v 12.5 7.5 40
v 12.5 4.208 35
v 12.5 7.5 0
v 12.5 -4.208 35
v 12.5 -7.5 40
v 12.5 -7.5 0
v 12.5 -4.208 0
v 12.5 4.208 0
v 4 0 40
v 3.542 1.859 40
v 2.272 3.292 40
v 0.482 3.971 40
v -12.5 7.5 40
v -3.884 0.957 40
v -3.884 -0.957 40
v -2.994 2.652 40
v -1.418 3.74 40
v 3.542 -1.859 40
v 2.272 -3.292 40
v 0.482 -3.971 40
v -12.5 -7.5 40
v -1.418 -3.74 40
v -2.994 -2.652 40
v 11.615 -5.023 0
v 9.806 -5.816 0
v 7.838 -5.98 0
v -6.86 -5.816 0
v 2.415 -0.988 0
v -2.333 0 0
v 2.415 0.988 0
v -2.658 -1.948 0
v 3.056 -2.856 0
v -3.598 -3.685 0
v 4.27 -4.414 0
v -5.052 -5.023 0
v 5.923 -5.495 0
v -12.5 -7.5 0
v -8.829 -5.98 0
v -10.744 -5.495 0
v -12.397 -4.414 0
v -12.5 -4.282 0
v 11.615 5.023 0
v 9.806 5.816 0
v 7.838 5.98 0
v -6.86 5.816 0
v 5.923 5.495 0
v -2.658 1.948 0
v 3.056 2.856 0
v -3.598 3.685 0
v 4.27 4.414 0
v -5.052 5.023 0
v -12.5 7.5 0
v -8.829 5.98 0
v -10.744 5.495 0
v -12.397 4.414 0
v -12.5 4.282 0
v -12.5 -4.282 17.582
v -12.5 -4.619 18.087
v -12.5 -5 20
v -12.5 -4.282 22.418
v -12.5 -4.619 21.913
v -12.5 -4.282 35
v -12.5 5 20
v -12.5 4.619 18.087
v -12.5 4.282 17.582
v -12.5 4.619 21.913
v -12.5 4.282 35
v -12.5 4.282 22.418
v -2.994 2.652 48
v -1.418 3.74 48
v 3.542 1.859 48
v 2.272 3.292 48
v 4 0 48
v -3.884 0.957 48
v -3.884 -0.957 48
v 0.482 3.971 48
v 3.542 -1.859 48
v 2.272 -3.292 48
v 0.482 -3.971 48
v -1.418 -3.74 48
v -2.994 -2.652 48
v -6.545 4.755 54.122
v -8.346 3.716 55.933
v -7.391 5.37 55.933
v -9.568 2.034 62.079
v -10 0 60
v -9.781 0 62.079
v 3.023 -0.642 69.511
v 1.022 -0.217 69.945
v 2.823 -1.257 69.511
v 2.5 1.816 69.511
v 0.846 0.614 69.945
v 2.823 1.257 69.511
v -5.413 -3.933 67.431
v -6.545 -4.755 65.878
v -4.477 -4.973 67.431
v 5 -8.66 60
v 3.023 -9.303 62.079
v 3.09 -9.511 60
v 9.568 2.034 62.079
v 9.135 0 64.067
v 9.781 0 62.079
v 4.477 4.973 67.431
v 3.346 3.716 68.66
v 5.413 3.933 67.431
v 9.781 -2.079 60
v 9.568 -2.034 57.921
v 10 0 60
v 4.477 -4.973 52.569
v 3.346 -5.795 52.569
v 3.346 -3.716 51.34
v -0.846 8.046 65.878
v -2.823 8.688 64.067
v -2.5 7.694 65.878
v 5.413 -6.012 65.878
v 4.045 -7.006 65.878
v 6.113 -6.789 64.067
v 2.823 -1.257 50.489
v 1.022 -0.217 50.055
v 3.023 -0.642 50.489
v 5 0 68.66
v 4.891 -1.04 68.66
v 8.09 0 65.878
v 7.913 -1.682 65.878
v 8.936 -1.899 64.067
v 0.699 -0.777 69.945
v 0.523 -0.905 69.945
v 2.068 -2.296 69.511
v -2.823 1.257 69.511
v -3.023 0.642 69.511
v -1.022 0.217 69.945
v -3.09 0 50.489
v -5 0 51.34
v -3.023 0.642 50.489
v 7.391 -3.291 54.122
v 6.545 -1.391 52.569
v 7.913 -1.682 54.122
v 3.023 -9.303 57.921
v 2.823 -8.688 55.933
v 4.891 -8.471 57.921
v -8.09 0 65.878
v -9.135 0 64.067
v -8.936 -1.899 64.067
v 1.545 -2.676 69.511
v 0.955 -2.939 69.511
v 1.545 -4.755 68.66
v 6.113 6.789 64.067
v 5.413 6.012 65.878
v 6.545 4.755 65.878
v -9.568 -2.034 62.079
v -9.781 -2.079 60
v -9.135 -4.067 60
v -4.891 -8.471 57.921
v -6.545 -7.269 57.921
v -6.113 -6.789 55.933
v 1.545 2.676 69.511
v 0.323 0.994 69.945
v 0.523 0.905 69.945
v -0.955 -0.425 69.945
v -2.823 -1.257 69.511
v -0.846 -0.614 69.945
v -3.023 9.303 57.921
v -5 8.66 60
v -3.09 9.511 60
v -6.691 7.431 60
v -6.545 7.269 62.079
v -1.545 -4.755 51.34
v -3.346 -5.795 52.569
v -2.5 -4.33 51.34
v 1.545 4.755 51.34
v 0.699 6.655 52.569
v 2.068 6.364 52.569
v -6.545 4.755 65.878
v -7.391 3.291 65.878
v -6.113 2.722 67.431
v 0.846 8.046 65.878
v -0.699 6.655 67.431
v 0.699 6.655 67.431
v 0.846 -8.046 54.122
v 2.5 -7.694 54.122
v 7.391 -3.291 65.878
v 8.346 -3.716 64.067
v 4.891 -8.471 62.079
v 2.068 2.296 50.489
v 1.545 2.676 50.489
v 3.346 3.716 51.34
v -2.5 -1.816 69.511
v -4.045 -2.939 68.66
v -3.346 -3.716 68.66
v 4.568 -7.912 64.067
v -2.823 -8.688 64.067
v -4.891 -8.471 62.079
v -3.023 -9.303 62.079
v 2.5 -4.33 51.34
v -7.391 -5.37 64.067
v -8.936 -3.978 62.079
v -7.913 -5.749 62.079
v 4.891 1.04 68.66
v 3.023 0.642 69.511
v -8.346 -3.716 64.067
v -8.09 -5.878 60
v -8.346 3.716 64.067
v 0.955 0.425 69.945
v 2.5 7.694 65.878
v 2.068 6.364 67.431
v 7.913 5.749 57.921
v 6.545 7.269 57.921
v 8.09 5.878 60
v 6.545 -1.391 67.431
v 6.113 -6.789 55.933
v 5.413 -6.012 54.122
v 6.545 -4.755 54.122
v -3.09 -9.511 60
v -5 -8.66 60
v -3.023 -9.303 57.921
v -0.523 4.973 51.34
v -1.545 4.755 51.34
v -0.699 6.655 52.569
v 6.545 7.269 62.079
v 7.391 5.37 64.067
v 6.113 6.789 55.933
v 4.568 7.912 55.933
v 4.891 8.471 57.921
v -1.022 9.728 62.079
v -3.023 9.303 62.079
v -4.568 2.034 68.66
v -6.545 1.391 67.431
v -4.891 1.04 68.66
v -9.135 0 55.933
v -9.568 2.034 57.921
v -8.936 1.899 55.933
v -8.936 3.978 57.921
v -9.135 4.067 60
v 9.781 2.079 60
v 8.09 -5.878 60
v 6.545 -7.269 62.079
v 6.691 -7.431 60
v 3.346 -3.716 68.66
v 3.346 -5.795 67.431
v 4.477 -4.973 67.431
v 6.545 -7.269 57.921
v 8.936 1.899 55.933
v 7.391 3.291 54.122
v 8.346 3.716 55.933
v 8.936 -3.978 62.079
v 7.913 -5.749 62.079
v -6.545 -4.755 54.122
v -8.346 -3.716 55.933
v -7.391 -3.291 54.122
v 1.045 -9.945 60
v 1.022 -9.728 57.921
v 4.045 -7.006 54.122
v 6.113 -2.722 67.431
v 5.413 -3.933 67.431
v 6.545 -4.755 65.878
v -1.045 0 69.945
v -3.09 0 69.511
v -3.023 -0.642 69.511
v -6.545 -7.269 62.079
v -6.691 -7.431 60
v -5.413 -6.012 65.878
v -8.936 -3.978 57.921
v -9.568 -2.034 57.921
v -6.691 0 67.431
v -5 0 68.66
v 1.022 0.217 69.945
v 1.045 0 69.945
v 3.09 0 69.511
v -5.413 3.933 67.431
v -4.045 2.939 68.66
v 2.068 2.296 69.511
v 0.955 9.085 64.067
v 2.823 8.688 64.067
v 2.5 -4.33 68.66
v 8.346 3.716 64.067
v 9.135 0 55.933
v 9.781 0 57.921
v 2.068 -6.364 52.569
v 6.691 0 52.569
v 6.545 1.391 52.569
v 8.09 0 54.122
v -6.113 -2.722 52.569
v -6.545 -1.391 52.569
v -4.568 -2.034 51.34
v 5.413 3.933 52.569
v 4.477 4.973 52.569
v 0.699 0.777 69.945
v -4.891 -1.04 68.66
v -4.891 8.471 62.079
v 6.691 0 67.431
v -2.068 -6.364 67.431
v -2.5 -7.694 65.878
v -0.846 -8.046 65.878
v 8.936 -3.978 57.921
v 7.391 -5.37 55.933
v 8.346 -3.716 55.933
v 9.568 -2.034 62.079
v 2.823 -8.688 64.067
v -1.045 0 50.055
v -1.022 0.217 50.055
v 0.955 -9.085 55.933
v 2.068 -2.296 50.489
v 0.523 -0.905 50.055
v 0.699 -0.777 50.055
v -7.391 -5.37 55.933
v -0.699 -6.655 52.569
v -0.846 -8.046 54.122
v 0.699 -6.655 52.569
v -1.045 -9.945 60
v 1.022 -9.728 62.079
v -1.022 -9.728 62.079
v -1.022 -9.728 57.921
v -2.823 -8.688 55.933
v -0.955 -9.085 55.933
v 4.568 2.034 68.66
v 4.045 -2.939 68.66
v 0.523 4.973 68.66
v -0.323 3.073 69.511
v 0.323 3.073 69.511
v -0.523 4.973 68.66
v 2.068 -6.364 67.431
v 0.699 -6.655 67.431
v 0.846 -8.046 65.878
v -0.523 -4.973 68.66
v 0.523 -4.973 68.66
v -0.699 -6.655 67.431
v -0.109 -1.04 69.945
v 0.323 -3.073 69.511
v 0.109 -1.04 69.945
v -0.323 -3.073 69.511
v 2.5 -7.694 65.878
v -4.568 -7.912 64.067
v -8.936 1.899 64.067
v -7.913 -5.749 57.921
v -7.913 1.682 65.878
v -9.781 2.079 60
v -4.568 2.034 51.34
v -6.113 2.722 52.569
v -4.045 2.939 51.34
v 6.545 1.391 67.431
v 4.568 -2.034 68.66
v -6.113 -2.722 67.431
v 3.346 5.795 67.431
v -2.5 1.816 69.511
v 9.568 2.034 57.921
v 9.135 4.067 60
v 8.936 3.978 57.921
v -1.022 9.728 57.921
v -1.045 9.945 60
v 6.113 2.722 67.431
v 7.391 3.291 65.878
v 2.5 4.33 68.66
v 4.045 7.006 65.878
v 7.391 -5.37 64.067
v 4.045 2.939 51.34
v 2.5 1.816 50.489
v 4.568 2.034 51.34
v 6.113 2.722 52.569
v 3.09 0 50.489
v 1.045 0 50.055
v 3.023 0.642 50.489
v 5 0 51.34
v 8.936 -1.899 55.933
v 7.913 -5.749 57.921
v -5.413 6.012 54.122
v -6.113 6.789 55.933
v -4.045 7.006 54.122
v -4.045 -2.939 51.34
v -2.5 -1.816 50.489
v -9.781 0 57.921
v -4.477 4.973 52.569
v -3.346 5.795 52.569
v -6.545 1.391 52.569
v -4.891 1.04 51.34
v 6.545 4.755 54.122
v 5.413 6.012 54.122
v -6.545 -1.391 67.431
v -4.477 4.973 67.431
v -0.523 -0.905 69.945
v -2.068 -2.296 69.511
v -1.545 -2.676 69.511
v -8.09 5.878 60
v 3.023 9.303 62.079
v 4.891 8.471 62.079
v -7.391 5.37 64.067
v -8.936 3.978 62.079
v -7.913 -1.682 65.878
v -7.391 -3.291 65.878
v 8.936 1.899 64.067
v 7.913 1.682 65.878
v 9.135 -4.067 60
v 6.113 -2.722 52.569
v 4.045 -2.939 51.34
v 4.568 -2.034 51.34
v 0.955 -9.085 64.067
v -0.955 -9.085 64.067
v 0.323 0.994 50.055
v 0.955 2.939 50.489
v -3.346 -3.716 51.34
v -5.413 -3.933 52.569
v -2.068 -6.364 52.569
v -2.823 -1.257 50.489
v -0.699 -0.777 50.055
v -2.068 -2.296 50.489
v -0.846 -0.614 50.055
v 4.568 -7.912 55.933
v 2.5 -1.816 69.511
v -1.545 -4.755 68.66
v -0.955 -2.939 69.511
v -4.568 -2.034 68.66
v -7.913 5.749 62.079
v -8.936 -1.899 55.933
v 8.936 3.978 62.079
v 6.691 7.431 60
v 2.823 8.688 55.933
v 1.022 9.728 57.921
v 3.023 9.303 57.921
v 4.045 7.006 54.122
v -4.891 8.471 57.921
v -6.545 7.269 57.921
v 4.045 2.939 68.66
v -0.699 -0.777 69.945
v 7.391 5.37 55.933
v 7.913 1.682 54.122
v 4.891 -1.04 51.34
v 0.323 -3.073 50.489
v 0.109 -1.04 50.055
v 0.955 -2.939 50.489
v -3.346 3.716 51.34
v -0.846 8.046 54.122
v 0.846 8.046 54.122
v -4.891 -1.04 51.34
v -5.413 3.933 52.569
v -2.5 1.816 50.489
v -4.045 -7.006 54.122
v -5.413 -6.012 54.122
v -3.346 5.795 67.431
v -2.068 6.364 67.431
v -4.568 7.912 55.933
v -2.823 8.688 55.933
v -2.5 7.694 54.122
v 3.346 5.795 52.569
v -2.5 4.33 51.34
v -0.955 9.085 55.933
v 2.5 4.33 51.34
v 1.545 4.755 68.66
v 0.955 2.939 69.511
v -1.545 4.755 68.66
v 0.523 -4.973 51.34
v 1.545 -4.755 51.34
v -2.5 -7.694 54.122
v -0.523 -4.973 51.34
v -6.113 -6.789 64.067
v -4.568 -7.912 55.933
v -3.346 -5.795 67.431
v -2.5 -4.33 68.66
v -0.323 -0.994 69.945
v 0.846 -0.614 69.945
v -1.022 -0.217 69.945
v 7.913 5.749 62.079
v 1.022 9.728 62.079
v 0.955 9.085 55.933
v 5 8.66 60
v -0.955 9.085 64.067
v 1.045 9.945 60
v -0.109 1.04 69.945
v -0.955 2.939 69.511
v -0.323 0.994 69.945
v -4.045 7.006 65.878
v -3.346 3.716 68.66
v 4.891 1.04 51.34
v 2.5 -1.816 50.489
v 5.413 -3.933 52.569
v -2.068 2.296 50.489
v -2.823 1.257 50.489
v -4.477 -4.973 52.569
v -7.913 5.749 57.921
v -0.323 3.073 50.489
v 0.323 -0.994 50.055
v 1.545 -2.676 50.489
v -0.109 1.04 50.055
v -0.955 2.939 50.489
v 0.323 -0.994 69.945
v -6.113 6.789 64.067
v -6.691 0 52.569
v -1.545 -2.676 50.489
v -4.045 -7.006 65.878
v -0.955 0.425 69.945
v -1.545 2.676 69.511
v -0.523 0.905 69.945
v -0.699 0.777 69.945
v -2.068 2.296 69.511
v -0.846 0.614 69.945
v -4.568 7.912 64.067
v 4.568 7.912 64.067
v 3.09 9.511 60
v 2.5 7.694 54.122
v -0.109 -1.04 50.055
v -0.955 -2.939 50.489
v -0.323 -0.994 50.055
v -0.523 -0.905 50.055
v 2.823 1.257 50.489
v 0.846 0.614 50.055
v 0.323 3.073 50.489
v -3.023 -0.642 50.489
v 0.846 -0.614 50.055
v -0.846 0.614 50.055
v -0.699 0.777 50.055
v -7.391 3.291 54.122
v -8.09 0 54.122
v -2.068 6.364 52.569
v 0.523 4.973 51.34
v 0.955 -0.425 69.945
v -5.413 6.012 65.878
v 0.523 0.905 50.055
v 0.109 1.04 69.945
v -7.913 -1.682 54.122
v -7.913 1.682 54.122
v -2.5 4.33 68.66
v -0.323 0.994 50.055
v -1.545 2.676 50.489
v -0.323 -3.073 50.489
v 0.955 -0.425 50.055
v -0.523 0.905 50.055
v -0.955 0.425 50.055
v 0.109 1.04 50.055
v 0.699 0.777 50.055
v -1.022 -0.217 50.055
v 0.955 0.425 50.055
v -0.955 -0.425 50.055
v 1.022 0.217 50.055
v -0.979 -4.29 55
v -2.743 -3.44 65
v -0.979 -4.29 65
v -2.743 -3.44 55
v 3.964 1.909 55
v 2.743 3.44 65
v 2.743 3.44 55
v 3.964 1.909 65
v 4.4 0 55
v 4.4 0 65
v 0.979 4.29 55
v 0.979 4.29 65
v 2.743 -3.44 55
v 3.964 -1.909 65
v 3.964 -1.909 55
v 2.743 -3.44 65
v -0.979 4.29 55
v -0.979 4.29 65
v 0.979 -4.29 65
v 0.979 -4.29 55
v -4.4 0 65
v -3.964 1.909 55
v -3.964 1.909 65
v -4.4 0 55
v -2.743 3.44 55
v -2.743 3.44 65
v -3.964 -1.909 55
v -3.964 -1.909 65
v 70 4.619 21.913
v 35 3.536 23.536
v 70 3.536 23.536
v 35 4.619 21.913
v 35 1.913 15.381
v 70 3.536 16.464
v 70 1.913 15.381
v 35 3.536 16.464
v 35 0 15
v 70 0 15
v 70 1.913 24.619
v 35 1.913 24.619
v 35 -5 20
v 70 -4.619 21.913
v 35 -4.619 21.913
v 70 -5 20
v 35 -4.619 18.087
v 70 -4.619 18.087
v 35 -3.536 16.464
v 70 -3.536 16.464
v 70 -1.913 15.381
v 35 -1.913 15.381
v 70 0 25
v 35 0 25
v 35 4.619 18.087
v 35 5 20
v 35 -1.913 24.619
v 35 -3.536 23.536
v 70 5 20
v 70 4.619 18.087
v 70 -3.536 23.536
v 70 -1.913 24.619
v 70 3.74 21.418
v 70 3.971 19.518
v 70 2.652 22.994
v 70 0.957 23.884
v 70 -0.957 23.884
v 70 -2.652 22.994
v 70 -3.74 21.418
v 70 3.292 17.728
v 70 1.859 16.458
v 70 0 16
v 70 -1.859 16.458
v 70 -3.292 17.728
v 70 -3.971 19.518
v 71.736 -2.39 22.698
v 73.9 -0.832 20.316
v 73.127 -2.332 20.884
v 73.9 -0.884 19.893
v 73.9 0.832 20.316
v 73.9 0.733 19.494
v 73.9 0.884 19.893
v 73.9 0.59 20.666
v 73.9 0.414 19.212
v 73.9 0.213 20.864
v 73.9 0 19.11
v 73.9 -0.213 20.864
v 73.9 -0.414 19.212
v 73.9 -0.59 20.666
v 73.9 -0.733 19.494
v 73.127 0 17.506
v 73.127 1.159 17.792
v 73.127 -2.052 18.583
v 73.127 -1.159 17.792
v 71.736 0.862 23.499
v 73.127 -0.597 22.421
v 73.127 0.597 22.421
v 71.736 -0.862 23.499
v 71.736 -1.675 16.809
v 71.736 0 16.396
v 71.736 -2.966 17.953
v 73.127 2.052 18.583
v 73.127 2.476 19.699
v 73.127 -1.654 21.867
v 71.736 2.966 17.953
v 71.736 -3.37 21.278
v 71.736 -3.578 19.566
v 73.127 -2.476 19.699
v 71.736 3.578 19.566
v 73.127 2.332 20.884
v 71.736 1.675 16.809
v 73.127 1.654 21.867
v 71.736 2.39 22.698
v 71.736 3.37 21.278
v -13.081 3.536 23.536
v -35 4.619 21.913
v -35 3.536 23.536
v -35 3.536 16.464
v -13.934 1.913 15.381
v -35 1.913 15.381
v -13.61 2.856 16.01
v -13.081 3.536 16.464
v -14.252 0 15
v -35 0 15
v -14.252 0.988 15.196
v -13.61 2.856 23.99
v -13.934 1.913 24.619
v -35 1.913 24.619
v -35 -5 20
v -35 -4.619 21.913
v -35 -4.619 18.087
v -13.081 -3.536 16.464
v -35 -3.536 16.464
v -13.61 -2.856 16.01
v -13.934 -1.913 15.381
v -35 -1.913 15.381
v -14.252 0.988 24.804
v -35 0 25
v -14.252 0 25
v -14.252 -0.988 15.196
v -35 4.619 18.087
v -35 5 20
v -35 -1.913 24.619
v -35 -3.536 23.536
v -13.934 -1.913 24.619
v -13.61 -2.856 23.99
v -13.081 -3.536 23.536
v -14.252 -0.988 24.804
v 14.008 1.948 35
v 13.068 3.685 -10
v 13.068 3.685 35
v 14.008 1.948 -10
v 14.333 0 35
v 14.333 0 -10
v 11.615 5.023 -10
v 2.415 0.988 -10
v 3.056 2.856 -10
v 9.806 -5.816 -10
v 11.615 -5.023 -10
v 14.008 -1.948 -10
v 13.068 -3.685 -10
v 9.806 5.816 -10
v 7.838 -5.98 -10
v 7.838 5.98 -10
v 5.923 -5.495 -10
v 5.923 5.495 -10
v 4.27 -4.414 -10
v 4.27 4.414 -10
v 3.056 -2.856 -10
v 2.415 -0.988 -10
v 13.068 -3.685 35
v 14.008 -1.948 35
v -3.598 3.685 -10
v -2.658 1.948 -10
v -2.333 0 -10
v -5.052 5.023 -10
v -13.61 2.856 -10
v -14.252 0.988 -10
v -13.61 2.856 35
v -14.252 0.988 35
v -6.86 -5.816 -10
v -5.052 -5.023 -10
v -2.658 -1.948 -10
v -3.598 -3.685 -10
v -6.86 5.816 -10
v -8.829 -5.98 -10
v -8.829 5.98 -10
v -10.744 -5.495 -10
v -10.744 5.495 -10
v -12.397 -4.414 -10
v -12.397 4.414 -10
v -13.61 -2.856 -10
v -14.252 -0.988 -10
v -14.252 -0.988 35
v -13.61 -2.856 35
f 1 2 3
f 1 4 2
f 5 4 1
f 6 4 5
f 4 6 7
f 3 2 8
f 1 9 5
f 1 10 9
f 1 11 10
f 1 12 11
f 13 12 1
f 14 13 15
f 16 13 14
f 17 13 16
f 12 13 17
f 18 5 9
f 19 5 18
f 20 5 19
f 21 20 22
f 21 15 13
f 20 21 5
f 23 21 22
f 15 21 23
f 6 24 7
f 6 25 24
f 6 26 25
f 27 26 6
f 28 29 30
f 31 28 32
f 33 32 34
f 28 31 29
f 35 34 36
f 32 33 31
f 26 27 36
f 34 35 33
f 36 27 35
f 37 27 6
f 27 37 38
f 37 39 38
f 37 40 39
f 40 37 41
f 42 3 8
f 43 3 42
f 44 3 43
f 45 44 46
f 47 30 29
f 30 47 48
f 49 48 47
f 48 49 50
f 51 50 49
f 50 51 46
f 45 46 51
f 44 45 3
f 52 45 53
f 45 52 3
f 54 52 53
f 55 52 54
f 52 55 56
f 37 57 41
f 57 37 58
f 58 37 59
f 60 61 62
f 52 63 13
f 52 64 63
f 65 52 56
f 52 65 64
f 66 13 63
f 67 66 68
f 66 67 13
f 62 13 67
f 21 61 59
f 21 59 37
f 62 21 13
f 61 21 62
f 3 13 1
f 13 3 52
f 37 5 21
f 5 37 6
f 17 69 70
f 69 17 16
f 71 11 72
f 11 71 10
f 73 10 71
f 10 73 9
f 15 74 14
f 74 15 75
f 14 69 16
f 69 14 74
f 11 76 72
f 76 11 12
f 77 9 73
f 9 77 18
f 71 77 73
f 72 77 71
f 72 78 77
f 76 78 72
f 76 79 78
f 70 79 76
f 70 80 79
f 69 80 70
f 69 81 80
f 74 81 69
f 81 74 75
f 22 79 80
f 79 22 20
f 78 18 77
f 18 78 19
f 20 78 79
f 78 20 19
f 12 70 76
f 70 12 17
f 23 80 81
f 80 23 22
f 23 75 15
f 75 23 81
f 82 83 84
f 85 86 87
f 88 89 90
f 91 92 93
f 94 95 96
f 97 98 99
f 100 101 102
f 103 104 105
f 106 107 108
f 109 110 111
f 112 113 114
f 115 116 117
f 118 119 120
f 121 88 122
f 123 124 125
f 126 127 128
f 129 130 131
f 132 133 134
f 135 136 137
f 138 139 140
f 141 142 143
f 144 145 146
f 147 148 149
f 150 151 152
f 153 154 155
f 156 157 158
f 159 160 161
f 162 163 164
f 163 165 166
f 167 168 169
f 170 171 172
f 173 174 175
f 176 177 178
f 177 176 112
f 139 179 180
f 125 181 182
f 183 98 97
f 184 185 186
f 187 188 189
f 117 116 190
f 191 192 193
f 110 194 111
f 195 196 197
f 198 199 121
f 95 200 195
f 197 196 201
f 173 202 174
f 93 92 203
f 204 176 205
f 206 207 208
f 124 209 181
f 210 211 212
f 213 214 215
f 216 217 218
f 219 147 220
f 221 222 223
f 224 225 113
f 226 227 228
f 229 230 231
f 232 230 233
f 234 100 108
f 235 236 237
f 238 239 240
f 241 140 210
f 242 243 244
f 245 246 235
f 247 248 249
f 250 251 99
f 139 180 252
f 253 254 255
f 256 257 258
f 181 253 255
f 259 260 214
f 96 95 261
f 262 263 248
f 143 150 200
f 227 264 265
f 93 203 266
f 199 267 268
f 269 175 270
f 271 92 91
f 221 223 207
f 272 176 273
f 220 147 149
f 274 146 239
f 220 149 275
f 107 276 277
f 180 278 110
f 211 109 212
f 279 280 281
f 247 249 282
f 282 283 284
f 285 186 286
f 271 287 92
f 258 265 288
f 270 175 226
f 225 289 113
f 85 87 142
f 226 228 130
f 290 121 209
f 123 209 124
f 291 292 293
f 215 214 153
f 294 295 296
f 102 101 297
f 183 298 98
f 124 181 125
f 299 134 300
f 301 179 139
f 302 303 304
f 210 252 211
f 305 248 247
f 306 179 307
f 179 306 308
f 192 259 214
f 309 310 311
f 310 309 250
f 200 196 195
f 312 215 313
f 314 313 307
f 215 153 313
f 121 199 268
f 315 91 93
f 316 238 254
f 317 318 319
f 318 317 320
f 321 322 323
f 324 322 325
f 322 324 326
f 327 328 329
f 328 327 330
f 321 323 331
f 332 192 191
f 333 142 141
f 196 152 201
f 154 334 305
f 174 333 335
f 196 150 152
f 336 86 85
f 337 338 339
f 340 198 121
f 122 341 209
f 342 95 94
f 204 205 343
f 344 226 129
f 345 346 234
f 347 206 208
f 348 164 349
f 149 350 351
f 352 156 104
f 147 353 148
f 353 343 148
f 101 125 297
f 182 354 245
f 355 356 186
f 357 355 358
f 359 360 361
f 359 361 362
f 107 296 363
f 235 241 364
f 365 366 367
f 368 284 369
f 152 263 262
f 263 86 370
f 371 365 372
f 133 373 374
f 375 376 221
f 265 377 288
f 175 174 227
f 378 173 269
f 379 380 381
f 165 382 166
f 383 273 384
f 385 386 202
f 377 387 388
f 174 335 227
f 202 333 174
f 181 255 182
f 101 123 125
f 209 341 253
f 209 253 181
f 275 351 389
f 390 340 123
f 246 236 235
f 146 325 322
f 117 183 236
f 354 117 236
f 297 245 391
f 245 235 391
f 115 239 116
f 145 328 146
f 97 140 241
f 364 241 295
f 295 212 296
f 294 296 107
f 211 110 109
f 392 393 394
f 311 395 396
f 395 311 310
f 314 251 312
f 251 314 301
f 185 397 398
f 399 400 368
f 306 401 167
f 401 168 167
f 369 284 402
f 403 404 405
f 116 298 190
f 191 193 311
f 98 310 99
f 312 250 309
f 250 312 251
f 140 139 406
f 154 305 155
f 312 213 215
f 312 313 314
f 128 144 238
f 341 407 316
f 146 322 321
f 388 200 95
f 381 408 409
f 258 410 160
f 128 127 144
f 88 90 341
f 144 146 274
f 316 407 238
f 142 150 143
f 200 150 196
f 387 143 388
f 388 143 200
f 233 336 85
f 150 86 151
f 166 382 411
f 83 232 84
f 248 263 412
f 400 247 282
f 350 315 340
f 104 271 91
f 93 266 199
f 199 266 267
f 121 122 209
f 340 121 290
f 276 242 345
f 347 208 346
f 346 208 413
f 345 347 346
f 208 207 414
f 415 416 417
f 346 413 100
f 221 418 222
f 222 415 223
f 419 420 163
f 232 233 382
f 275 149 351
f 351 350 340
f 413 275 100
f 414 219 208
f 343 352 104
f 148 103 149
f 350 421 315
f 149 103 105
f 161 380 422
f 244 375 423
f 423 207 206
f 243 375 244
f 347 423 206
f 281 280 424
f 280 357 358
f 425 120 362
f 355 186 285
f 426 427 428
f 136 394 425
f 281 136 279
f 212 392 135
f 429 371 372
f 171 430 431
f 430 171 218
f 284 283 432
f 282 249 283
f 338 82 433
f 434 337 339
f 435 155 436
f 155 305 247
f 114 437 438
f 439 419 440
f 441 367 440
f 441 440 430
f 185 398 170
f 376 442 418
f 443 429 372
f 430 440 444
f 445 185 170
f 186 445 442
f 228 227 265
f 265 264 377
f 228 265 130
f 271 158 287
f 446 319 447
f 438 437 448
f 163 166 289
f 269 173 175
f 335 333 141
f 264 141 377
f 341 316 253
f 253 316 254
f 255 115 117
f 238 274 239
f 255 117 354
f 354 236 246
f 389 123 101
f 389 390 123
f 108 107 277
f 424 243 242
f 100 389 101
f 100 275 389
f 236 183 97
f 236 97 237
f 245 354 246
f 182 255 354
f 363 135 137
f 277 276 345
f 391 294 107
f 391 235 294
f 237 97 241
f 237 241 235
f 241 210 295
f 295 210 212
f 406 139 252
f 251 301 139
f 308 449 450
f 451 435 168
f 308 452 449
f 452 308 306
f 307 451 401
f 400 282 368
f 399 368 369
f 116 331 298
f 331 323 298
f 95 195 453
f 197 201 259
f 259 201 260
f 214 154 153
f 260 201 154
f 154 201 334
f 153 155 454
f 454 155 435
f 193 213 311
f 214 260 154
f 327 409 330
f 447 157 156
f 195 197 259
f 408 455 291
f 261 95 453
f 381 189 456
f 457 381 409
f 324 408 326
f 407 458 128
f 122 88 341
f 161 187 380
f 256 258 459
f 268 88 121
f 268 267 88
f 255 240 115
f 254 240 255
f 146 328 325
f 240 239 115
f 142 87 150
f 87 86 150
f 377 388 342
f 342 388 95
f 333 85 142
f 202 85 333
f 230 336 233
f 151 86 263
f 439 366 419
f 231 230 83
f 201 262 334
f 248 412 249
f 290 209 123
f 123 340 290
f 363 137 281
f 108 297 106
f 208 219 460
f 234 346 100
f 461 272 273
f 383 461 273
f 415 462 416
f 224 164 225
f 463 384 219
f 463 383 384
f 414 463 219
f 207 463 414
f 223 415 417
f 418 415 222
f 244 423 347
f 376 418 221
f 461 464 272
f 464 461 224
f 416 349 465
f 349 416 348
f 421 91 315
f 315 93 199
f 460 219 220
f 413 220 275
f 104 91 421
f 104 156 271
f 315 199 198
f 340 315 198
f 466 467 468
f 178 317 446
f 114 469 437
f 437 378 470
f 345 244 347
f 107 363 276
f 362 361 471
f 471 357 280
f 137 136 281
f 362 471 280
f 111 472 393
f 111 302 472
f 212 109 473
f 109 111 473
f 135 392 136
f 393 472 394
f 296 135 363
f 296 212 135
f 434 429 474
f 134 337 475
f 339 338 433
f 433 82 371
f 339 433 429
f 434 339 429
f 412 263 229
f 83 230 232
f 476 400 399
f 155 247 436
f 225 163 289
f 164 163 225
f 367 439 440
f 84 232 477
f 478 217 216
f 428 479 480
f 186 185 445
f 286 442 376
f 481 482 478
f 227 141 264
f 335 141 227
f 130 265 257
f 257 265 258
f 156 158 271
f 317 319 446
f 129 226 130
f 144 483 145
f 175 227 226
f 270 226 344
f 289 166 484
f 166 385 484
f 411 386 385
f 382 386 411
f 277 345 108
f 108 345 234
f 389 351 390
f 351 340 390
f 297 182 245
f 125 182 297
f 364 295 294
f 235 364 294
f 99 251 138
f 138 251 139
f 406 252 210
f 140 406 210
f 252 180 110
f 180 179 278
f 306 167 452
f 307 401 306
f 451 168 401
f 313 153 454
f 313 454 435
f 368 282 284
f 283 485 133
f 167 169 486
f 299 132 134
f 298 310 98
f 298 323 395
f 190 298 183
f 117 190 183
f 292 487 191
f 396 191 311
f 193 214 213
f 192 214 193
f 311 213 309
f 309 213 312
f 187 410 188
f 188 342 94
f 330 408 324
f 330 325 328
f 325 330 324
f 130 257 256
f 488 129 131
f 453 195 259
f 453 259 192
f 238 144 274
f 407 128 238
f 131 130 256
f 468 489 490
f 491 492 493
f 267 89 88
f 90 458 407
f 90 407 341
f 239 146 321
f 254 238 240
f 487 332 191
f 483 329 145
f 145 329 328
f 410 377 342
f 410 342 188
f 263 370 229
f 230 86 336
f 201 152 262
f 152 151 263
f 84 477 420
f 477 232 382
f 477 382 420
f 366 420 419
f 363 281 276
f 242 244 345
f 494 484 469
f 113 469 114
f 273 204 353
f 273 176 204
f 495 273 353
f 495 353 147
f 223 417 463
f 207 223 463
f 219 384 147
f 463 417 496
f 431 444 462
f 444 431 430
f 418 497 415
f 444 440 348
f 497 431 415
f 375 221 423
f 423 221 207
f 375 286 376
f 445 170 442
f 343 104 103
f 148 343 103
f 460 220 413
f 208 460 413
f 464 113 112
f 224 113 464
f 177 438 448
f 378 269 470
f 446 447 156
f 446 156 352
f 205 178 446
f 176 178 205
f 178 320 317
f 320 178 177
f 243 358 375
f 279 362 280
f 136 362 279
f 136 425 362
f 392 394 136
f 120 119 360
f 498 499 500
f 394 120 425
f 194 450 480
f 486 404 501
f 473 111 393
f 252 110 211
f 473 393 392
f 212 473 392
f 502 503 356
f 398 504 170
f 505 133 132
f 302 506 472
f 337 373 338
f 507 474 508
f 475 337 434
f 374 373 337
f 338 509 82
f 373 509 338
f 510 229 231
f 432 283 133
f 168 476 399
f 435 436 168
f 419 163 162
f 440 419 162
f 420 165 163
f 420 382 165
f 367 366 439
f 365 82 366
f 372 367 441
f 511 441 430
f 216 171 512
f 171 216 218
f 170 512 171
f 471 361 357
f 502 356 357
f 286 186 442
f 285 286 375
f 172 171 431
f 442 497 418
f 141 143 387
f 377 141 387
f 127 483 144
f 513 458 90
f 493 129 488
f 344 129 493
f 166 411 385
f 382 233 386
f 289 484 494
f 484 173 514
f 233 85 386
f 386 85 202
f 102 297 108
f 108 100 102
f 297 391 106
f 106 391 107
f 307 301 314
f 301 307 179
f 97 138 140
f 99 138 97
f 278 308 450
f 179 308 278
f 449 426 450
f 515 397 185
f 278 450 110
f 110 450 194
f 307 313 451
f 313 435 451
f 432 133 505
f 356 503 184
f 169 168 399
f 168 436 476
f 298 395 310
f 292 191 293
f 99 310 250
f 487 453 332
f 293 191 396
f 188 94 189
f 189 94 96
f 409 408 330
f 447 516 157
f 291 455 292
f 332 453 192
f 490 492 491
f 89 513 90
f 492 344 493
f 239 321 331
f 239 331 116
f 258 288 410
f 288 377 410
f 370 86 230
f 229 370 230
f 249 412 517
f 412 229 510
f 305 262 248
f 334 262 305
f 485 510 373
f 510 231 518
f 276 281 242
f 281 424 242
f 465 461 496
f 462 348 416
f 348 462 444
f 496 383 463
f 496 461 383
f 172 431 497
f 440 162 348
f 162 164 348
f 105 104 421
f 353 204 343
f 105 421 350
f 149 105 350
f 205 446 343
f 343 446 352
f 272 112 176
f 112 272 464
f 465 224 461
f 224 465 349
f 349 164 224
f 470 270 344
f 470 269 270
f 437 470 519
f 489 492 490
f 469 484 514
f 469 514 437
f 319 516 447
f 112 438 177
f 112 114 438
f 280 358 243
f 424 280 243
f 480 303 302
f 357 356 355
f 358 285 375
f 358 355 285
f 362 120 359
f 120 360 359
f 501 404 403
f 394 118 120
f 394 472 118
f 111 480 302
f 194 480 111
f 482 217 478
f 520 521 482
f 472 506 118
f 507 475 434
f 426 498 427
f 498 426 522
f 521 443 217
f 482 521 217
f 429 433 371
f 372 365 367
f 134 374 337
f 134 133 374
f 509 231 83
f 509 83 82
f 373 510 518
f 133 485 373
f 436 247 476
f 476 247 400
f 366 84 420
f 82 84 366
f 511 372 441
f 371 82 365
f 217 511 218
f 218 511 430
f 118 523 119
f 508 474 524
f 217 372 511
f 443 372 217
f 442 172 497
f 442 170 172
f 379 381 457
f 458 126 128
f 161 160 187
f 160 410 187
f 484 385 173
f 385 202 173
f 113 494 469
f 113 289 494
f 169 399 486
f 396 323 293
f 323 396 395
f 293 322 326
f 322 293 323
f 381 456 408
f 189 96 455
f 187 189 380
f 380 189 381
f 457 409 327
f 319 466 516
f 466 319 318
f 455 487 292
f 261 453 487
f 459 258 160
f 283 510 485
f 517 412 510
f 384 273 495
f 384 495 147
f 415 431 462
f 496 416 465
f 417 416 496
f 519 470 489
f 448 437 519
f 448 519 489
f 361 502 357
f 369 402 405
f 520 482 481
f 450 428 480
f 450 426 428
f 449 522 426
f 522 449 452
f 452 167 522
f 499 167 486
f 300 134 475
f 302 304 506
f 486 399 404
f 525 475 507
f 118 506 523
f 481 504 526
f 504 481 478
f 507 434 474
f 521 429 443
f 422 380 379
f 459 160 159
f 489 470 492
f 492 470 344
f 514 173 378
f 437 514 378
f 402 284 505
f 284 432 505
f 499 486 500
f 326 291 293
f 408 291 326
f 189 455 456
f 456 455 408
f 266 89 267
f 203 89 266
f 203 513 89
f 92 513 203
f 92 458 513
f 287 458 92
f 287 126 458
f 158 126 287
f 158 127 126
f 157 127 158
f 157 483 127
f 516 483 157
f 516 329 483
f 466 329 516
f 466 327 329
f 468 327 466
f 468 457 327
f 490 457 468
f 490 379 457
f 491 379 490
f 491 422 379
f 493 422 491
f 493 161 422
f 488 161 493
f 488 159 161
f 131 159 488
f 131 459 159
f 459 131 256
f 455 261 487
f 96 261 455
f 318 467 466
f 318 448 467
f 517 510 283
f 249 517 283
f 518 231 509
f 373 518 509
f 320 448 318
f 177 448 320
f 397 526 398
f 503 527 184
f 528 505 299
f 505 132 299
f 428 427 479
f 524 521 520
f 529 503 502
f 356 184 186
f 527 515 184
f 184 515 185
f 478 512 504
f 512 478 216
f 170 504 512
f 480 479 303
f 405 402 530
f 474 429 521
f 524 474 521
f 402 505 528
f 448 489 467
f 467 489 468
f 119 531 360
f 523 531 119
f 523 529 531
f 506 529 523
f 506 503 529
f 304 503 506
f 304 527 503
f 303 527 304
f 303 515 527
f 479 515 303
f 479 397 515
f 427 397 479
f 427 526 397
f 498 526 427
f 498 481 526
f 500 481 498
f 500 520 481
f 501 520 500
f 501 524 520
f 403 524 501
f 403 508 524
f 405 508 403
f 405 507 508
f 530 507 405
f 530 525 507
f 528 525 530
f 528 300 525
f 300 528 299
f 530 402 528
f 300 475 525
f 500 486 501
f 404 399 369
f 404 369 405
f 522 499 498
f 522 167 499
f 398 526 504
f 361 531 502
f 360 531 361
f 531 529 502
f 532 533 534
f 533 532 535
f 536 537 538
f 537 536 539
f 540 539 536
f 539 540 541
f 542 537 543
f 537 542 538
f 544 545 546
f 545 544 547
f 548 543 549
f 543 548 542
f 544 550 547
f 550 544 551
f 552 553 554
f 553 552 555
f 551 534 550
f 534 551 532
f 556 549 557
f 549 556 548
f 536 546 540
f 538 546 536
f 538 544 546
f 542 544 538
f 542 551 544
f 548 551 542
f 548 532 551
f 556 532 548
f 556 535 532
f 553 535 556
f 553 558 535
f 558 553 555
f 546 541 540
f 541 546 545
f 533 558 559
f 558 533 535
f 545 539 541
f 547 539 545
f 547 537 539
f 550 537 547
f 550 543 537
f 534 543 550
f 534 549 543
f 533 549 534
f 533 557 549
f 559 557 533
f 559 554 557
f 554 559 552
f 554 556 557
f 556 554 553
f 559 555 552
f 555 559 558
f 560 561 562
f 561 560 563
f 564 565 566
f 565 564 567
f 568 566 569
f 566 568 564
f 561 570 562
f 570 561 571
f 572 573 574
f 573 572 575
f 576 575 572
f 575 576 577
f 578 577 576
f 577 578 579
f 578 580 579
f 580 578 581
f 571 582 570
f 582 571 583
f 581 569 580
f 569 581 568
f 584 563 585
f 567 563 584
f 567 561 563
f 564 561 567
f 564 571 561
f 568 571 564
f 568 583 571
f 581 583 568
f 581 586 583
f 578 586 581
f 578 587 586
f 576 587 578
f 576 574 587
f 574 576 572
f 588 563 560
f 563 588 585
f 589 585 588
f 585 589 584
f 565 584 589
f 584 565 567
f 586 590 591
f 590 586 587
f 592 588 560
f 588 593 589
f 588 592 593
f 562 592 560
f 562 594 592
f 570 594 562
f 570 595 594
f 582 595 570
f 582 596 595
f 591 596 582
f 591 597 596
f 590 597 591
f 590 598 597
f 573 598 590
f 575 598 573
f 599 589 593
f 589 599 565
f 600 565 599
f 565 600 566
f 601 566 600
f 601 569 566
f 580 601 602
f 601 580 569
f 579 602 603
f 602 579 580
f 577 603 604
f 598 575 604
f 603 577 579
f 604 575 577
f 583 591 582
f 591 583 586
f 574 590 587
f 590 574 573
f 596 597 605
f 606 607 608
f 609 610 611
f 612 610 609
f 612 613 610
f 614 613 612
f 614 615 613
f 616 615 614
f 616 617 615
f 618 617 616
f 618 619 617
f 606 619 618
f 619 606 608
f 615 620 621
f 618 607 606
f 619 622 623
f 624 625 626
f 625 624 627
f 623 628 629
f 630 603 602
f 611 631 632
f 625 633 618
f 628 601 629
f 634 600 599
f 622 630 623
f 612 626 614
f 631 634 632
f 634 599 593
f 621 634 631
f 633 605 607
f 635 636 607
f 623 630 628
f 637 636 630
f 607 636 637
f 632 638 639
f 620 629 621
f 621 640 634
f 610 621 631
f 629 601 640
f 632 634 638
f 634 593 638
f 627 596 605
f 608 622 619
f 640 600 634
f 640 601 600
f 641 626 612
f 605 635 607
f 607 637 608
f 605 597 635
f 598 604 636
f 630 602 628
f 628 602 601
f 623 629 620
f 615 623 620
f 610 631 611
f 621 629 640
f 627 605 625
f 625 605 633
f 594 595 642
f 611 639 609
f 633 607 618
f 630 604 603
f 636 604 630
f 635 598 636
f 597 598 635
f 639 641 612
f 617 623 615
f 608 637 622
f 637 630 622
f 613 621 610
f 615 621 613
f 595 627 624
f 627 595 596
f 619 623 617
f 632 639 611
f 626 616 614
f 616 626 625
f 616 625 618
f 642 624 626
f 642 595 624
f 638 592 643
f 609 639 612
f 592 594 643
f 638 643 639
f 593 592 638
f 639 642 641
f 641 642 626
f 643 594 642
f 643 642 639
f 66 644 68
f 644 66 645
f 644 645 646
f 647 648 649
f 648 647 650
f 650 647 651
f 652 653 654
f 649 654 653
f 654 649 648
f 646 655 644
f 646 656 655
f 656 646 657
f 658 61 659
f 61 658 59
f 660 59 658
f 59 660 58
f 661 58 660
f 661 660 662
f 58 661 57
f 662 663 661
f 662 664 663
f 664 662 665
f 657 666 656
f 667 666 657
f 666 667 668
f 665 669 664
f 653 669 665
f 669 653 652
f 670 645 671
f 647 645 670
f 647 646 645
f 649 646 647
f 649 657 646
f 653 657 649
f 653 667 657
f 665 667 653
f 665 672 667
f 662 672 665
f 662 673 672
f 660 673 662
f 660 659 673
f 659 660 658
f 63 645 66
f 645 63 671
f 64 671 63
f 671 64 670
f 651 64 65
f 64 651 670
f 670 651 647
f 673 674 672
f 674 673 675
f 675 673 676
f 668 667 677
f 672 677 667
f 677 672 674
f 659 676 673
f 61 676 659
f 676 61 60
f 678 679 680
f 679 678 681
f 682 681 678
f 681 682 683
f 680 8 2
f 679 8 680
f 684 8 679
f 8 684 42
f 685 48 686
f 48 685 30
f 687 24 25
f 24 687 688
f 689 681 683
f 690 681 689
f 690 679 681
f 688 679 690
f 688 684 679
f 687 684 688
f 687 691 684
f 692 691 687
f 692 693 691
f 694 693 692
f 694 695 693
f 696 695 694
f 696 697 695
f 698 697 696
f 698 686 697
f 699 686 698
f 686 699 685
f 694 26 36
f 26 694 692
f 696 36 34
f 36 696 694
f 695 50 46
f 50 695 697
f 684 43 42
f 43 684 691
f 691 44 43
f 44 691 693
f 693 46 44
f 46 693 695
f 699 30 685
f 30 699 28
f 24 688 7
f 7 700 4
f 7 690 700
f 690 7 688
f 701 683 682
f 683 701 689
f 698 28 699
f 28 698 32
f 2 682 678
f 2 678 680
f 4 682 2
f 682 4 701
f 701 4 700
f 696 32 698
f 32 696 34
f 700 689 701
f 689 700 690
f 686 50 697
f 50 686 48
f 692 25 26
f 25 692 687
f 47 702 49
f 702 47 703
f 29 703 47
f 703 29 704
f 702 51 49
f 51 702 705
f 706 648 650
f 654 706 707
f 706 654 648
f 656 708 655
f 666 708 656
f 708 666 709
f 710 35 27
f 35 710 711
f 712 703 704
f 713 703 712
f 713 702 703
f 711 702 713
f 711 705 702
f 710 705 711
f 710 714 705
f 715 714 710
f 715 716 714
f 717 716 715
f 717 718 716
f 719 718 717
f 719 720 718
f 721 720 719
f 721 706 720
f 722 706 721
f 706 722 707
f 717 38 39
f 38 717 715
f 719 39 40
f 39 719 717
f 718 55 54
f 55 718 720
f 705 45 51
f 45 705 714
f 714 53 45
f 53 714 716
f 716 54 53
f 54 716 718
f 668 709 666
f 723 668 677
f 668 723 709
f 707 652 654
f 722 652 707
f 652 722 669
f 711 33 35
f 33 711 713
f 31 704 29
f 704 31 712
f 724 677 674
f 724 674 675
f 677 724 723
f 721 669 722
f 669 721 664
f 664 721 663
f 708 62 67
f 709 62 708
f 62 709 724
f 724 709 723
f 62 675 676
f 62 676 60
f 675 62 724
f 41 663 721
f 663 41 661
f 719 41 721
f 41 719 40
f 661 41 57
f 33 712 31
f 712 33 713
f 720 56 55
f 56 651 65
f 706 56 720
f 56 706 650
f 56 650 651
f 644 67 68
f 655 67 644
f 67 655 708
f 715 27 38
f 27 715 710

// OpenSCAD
// Generated by SolidPython 1.1.3 on 2025-01-26 01:26:25


union() {
	translate(v = [0, 0, 20.0000000000]) {
		union() {
			cube(center = true, size = [25, 15, 40]);
			translate(v = [0, 0, 20.0000000000]) {
				cylinder(h = 8, r = 4);
			}
		}
	}
	translate(v = [0, 0, 60]) {
		difference() {
			sphere(r = 10);
			translate(v = [0, 0, -5.0000000000]) {
				cylinder(h = 10, r = 4.4000000000);
			}
		}
	}
	translate(v = [35, 0, 20.0000000000]) {
		rotate(a = [0, 90, 0]) {
			union() {
				cylinder(h = 35, r = 5);
				translate(v = [0, 0, 35]) {
					sphere(r = 4);
				}
			}
		}
	}
	translate(v = [-35, 0, 20.0000000000]) {
		rotate(a = [0, 90, 0]) {
			union() {
				cylinder(h = 35, r = 5);
				translate(v = [0, 0, 35]) {
					sphere(r = 4);
				}
			}
		}
	}
	translate(v = [8.3333333333, 0, -10]) {
		union() {
			cylinder(h = 45, r = 6);
			translate(v = [0, 0, 45]) {
				sphere(r = 4);
			}
			translate(v = [0, 0, 22.5000000000]) {
				sphere(r = 4);
			}
		}
	}
	translate(v = [-8.3333333333, 0, -10]) {
		union() {
			cylinder(h = 45, r = 6);
			translate(v = [0, 0, 45]) {
				sphere(r = 4);
			}
			translate(v = [0, 0, 22.5000000000]) {
				sphere(r = 4);
			}
		}
	}
}
/***********************************************
*********      SolidPython code:      **********
************************************************
 
from solid import *
from solid.utils import *
import math

class PrintInPlaceSoldier:
    def __init__(self):
        self.head_radius = 10
        self.body_width = 25
        self.body_height = 40
        self.body_depth = 15
        self.arm_length = 35
        self.arm_radius = 5
        self.leg_length = 45
        self.leg_radius = 6
        self.joint_radius = 4
        self.clearance = 0.4

    def create_head(self):
        # Create head with neck socket
        head = sphere(r=self.head_radius)
        socket = cylinder(r=self.joint_radius + self.clearance, h=self.head_radius)
        head = difference()(
            head,
            translate([0, 0, -self.head_radius/2])(socket)
        )
        return head

    def create_body(self):
        # Main body
        body = cube([self.body_width, self.body_depth, self.body_height], center=True)
        
        # Neck joint
        neck = cylinder(r=self.joint_radius, h=8)
        body = union()(
            body,
            translate([0, 0, self.body_height/2])(neck)
        )
        return body

    def create_arm(self, side=1):
        # Create arm with ball joint
        arm = cylinder(r=self.arm_radius, h=self.arm_length)
        ball = sphere(r=self.joint_radius)
        arm = union()(
            arm,
            translate([0, 0, self.arm_length])(ball)
        )
        return rotate([0, 90, 0])(arm)

    def create_leg(self, side=1):
        # Create leg with ball joints
        leg = cylinder(r=self.leg_radius, h=self.leg_length)
        hip_ball = sphere(r=self.joint_radius)
        knee_ball = sphere(r=self.joint_radius)
        
        leg = union()(
            leg,
            translate([0, 0, self.leg_length])(hip_ball),
            translate([0, 0, self.leg_length/2])(knee_ball)
        )
        return leg

    def generate_print_layout(self):
        # Layout all parts with proper spacing
        spacing = 10
        
        # Body at center
        assembly = translate([0, 0, self.body_height/2])(self.create_body())
        
        # Head above body
        head = translate([0, 0, self.body_height + self.head_radius + spacing])(
            self.create_head()
        )
        
        # Arms on sides
        right_arm = translate([self.body_width + spacing, 0, self.body_height/2])(
            self.create_arm(1)
        )
        left_arm = translate([-self.body_width - spacing, 0, self.body_height/2])(
            self.create_arm(-1)
        )
        
        # Legs below
        right_leg = translate([self.body_width/3, 0, -spacing])(
            self.create_leg(1)
        )
        left_leg = translate([-self.body_width/3, 0, -spacing])(
            self.create_leg(-1)
        )
        
        # Combine all parts
        assembly = union()(
            assembly,
            head,
            right_arm,
            left_arm,
            right_leg,
            left_leg
        )
        
        return assembly

    def save_stl(self):
        assembly = self.generate_print_layout()
        scad_render_to_file(assembly, 'soldier_toy_print.scad')
        print("OpenSCAD file generated. Please use OpenSCAD to export to STL.")

if __name__ == '__main__':
    soldier = PrintInPlaceSoldier()
    soldier.save_stl() 
 
************************************************/
